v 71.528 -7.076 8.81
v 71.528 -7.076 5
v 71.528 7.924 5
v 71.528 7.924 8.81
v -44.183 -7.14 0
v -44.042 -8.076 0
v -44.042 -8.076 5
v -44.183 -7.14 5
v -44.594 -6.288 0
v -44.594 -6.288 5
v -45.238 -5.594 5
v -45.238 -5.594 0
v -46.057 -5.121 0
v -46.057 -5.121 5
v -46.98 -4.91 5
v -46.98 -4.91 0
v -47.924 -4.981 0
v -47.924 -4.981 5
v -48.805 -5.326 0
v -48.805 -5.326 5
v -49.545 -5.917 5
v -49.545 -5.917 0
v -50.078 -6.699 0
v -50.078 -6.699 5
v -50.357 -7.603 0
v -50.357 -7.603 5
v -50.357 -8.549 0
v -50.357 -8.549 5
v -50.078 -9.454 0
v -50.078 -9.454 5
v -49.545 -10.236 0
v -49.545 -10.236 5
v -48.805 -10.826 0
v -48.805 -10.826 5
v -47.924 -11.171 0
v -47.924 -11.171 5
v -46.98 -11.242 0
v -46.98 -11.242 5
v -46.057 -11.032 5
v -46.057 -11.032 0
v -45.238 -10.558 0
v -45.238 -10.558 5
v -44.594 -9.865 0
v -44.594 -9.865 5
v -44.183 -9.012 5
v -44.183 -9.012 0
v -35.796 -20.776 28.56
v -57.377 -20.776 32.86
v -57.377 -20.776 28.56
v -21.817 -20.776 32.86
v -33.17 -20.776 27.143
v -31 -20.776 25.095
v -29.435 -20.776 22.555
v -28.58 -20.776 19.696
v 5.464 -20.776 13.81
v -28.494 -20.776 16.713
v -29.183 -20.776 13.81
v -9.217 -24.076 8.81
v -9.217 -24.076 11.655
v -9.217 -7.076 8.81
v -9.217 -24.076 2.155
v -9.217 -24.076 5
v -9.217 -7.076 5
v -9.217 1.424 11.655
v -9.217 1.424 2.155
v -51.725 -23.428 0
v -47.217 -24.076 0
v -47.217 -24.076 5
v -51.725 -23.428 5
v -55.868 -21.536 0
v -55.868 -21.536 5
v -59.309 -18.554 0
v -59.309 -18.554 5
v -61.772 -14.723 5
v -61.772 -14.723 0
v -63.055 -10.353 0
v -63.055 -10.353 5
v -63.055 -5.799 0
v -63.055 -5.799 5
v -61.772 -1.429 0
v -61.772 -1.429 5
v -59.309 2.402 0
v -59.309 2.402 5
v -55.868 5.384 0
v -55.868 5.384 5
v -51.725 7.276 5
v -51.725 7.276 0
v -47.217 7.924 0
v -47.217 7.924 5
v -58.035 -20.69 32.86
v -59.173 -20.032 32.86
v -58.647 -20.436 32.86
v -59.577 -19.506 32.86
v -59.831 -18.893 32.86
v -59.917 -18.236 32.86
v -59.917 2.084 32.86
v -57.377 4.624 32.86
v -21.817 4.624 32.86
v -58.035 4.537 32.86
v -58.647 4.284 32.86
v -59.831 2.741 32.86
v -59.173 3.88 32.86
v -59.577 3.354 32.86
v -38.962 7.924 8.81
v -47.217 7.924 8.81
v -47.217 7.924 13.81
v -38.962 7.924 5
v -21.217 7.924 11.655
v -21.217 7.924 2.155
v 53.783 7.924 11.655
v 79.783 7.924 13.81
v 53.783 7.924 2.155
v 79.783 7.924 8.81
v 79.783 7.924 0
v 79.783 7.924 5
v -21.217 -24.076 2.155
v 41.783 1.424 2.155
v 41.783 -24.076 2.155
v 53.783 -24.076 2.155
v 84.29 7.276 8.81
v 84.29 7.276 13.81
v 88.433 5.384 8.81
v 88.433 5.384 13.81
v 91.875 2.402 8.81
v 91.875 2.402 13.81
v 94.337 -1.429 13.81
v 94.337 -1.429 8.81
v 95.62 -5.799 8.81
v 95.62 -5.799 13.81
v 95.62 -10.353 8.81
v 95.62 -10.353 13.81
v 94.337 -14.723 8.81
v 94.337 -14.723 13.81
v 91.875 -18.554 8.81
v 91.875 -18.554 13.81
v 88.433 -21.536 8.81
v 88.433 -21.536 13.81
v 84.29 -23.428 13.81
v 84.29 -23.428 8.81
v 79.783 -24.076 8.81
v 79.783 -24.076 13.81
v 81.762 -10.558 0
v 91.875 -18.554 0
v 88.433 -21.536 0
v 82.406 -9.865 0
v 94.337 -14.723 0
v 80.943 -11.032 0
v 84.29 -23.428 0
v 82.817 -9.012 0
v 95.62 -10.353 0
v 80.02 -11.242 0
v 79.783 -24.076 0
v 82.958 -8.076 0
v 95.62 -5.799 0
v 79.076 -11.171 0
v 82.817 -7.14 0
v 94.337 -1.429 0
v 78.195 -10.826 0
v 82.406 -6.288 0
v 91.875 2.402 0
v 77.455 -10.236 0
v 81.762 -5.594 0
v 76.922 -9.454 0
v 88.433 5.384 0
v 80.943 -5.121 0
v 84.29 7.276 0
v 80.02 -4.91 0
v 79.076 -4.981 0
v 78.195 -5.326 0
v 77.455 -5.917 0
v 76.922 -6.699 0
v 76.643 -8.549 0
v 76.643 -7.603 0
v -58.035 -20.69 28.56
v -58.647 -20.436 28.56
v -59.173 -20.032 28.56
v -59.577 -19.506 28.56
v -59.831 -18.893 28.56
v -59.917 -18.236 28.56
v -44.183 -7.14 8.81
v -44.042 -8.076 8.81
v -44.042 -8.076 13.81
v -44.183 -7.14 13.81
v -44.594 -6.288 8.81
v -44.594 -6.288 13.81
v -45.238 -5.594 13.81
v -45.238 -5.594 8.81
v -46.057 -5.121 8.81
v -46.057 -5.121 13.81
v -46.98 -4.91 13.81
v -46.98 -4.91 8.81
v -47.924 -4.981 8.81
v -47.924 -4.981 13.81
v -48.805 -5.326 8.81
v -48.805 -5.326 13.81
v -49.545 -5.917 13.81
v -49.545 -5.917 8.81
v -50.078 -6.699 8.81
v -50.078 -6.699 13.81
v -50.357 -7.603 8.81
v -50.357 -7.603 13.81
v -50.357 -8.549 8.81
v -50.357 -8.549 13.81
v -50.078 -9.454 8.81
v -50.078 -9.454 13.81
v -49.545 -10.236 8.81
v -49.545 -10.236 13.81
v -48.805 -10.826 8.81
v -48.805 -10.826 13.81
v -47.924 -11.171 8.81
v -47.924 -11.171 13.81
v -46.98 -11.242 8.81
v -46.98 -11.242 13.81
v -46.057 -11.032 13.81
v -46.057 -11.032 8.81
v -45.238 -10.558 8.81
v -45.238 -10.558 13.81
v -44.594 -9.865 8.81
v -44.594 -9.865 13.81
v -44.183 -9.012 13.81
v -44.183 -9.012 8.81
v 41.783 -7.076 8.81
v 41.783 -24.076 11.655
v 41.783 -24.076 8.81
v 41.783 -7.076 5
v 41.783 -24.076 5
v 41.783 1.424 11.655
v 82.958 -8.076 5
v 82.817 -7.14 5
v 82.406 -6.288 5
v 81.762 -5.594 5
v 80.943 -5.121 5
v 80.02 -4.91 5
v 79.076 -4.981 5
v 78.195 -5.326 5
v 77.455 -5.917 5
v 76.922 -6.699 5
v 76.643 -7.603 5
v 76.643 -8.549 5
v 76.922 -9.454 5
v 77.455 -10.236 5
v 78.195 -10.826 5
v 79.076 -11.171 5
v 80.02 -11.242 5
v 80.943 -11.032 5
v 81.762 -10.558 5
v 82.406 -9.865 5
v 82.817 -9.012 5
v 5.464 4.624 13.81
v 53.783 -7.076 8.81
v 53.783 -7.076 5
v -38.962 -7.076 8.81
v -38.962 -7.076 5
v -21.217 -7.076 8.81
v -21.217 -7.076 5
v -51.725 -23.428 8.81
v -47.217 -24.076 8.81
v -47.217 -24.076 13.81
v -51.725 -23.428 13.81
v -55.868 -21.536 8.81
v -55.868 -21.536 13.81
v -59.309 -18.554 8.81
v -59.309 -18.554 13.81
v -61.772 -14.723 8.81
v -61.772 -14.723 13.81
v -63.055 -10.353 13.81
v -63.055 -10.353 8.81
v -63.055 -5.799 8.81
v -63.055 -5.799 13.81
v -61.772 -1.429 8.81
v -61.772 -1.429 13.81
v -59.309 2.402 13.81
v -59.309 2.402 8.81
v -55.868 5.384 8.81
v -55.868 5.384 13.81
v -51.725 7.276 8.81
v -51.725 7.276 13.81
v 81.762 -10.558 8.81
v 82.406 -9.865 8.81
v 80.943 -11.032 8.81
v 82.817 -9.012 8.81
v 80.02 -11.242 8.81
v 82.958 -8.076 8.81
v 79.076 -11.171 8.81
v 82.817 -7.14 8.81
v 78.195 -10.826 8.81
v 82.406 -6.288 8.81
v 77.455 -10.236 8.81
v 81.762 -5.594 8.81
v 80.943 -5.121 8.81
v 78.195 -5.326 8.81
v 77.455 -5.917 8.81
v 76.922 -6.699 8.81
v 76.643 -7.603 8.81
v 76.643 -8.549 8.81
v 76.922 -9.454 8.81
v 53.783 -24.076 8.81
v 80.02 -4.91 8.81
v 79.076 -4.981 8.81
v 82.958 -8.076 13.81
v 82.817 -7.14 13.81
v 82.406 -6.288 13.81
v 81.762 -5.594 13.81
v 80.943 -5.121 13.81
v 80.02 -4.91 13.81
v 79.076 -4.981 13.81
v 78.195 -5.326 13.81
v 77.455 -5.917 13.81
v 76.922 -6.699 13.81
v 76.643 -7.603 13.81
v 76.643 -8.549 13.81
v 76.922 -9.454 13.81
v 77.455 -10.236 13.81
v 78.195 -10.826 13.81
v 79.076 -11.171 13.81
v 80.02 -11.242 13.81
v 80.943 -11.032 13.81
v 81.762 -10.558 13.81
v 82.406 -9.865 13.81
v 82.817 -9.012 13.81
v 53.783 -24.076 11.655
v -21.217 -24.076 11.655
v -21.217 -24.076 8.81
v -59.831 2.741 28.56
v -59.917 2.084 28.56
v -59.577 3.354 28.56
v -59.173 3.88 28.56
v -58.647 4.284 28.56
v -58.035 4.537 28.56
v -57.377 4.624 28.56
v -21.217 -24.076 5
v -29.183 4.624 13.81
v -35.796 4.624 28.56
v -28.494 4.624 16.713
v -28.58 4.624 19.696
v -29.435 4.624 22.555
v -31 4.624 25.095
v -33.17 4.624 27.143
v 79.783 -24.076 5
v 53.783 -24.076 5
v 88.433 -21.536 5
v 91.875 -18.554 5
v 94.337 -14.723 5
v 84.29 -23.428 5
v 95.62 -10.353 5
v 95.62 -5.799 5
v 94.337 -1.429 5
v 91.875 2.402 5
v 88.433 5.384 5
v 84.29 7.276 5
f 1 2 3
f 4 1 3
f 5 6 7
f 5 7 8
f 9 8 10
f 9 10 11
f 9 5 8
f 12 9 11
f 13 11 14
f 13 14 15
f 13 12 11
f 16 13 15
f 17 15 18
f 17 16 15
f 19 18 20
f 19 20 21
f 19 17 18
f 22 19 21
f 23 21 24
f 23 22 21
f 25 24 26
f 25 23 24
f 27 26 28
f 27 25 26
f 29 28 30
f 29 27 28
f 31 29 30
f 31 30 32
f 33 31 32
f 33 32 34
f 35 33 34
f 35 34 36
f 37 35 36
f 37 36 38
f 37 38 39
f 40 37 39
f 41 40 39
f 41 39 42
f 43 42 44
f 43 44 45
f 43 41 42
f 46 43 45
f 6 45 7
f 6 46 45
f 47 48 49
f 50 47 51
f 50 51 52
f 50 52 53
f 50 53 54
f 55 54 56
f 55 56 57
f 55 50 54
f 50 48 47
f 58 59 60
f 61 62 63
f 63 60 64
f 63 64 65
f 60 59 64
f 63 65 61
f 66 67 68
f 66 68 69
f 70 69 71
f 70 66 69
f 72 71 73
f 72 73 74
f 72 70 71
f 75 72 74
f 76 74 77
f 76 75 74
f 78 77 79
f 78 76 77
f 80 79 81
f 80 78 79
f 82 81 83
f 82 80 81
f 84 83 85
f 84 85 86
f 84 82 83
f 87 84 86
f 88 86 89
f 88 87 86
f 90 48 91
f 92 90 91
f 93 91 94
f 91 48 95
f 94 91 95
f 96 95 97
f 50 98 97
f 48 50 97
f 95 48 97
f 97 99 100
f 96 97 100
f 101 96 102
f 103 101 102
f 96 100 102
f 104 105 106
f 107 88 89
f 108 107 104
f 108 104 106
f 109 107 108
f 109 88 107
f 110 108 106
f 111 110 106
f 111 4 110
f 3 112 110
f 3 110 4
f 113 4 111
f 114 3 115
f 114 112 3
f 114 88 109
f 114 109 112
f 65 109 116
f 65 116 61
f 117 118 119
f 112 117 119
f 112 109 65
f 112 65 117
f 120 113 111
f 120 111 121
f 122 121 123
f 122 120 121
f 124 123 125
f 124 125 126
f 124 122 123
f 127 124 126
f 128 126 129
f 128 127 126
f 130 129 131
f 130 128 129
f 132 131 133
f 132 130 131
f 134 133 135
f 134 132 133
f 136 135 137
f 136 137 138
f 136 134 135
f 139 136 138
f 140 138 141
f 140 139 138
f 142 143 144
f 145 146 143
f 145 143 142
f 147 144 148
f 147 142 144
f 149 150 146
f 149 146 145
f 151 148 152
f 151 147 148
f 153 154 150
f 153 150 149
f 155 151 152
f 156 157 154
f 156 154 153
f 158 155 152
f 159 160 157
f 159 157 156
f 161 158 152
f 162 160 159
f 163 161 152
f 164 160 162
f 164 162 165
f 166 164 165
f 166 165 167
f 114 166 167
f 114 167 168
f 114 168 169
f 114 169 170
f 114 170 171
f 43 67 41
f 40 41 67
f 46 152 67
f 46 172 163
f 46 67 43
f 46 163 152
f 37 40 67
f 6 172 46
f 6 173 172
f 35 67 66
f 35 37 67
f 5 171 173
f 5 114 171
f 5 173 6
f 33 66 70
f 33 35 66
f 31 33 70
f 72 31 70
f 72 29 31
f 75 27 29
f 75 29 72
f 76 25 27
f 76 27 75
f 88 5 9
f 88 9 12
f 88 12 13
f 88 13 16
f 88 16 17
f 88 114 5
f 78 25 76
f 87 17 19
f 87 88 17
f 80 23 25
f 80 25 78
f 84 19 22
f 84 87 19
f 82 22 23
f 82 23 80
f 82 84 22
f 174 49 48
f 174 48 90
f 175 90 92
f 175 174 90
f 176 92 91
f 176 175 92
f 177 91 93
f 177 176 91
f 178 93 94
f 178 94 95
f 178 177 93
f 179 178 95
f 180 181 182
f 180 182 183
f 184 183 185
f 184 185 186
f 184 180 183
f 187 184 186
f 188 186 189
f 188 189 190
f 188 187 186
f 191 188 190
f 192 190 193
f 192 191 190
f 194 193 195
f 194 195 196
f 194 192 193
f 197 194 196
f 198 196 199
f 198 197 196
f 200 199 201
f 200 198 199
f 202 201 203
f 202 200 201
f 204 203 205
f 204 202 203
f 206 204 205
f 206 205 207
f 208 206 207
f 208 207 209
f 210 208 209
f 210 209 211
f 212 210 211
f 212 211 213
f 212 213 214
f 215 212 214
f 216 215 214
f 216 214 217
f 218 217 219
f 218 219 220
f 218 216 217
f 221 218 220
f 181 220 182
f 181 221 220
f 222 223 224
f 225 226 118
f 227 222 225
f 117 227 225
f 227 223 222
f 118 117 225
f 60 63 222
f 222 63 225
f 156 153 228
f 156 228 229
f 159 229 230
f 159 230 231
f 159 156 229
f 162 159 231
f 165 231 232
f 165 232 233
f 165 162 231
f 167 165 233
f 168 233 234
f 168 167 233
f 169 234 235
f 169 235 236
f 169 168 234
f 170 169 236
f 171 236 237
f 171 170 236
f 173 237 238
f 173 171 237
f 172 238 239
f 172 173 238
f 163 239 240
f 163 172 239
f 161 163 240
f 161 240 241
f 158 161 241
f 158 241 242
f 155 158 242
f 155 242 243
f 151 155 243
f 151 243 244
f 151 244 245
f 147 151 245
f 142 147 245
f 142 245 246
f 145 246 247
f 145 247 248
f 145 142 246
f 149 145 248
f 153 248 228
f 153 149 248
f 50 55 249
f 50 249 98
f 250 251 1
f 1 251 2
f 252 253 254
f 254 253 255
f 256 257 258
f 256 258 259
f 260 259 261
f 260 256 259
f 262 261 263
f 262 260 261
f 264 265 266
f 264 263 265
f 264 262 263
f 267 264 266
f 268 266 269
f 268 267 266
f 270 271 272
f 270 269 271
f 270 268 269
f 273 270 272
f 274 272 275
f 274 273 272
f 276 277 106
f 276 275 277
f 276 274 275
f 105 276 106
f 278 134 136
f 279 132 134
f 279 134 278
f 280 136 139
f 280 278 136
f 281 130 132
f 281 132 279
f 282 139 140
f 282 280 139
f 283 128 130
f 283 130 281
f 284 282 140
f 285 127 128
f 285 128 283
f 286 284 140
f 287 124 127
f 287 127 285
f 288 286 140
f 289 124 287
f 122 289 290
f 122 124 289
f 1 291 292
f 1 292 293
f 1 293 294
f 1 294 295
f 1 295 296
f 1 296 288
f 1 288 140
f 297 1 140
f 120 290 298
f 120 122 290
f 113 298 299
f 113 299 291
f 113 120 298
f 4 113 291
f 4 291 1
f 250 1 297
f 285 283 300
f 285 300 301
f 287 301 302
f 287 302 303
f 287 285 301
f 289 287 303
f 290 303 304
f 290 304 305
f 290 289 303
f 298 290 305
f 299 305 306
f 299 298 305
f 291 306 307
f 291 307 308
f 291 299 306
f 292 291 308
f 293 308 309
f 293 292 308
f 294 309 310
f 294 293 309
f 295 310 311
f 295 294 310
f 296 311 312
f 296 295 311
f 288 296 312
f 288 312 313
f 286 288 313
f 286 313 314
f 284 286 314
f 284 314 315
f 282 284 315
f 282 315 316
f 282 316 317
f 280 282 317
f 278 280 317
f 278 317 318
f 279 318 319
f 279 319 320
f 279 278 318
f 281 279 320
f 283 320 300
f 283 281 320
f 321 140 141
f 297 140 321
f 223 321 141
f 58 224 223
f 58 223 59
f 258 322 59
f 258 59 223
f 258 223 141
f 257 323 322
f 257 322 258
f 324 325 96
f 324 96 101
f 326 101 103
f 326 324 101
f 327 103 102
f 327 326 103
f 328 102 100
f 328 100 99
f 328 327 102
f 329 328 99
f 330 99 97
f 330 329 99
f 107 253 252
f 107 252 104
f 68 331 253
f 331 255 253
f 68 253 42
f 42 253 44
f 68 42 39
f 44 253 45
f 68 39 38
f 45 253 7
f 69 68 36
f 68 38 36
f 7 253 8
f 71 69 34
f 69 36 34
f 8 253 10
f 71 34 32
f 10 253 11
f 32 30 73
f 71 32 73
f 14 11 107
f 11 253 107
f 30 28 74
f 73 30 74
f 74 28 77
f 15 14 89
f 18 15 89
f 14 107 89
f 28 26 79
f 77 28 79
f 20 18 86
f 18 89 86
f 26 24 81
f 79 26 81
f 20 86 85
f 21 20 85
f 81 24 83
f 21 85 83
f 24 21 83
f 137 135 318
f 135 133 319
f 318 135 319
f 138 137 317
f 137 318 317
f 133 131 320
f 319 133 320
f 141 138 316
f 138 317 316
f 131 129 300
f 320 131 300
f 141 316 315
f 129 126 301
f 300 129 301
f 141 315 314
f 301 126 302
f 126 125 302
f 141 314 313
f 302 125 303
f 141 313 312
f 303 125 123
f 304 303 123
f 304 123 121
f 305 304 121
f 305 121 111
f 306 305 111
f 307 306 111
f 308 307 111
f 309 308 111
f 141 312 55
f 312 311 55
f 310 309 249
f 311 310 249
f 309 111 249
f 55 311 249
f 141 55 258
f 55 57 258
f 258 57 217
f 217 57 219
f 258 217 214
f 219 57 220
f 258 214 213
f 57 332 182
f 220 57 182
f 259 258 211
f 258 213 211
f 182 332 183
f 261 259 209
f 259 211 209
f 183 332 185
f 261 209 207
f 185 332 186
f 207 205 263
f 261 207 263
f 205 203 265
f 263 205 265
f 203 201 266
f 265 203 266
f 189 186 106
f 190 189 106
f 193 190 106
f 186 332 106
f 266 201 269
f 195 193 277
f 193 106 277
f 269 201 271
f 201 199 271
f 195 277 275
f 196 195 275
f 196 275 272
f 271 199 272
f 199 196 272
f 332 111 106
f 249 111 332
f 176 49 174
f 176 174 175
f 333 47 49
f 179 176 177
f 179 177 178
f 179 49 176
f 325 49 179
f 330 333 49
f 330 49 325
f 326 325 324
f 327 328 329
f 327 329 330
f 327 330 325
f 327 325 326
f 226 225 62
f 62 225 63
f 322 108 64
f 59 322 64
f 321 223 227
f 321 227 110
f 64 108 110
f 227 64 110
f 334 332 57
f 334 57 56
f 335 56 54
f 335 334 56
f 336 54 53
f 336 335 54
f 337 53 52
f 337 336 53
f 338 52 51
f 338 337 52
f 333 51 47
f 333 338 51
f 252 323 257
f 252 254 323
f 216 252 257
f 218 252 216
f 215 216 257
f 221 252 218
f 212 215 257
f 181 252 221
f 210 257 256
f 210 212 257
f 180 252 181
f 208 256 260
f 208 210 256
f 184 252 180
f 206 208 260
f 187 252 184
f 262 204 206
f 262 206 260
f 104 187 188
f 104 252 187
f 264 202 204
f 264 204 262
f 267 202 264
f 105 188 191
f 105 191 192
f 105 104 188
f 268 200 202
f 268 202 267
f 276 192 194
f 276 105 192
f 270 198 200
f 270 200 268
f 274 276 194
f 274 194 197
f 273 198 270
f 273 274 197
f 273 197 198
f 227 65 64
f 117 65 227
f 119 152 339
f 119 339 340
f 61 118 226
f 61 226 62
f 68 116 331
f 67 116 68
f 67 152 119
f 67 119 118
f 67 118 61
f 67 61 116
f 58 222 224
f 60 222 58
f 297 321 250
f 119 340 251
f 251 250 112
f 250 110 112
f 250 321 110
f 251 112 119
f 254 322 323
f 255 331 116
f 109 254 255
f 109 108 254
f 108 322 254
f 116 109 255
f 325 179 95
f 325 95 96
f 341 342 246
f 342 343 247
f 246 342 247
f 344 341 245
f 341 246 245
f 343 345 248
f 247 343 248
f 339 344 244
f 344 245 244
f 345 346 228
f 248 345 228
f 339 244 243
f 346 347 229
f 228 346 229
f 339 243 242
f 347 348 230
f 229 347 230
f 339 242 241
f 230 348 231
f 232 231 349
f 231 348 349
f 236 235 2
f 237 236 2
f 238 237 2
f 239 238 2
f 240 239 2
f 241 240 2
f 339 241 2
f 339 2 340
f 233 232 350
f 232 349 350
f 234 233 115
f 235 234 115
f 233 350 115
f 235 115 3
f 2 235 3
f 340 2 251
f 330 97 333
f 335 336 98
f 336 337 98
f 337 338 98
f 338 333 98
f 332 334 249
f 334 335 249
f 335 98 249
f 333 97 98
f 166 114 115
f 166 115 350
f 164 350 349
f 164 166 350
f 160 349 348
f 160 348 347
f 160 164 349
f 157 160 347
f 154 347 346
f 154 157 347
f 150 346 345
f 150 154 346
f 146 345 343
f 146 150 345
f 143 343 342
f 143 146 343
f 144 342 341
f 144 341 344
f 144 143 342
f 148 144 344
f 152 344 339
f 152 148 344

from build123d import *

# Parameters (mm, degrees)
SKETCH1_R           = 3.175
BOSS_EXTRUDE1_DEPTH = 5
SKETCH2_W           = 110.49
SKETCH2_H           = 15
BOSS_EXTRUDE2_DEPTH = 3.81
SKETCH5_R           = 3.175
BOSS_EXTRUDE3_DEPTH = 5
SKETCH6_W           = 75
SKETCH6_H           = 9.5
CUT_EXTRUDE1_DEPTH  = 6.5
SKETCH7_W           = 12
SKETCH7_H           = 9.5
CUT_EXTRUDE2_DEPTH  = 30.48
BOSS_EXTRUDE4_DEPTH = 19.05
CUT_EXTRUDE3_DEPTH  = 30.48
BOSS_EXTRUDE5_DEPTH = 25.4


with BuildPart() as part:
    # Sketch1 → Boss-Extrude1 (new body)
    with BuildSketch(Plane.XY):
        with BuildLine():
            Line((-47.217391304, 7.923913043), (79.782608696, 7.923913043))
            ThreePointArc((79.782608696, 7.923913043), (95.782608696, -8.076086957), (79.782608696, -24.076086957))
            Line((79.782608696, -24.076086957), (-47.217391304, -24.076086957))
            ThreePointArc((-47.217391304, -24.076086957), (-63.217391304, -8.076086957), (-47.217391304, 7.923913043))
        make_face()
        with Locations((-47.217391304, -8.076086957)):
            Circle(SKETCH1_R, mode=Mode.SUBTRACT)
        with Locations((79.782608696, -8.076086957)):
            Circle(SKETCH1_R, mode=Mode.SUBTRACT)
    extrude(amount=BOSS_EXTRUDE1_DEPTH)

    # Sketch2 → Boss-Extrude2 (add)
    with BuildSketch(Plane.XY.offset(5)):
        with Locations((16.282608696, 0.423913043)):
            Rectangle(SKETCH2_W, SKETCH2_H)
    extrude(amount=BOSS_EXTRUDE2_DEPTH)

    # Sketch5 → Boss-Extrude3 (add)
    with BuildSketch(Plane.XY.offset(8.81)):
        with BuildLine():
            Line((-47.217391304, 7.923913043), (79.782608696, 7.923913043))
            ThreePointArc((79.782608696, 7.923913043), (95.782608696, -8.076086957), (79.782608696, -24.076086957))
            Line((79.782608696, -24.076086957), (-47.217391304, -24.076086957))
            ThreePointArc((-47.217391304, -24.076086957), (-63.217391304, -8.076086957), (-47.217391304, 7.923913043))
        make_face()
        with Locations((-47.217391304, -8.076086957)):
            Circle(SKETCH5_R, mode=Mode.SUBTRACT)
        with Locations((79.782608696, -8.076086957)):
            Circle(SKETCH5_R, mode=Mode.SUBTRACT)
    extrude(amount=BOSS_EXTRUDE3_DEPTH)

    # Sketch6 → Cut-Extrude1 (cut)
    with BuildSketch(Plane(origin=(0, 7.923913043, 0), x_dir=(1, 0, 0), z_dir=(0, 1, 0))):
        with Locations((16.282608696, -6.905)):
            Rectangle(SKETCH6_W, SKETCH6_H)
    extrude(amount=-CUT_EXTRUDE1_DEPTH, mode=Mode.SUBTRACT)

    # Sketch7 → Cut-Extrude2 (cut)
    with BuildSketch(Plane(origin=(0, 1.423913043, 0), x_dir=(1, 0, 0), z_dir=(0, 1, 0))):
        with Locations((-15.217391304, -6.905)):
            Rectangle(SKETCH7_W, SKETCH7_H)
        with Locations((47.782608696, -6.905)):
            Rectangle(SKETCH7_W, SKETCH7_H)
    extrude(amount=-CUT_EXTRUDE2_DEPTH, mode=Mode.SUBTRACT)

    # Sketch10 → Boss-Extrude4 (add)
    with BuildSketch(Plane.XY.offset(13.81)):
        with BuildLine():
            Line((-34.517391304, -20.776086957), (-57.377391304, -20.776086957))
            ThreePointArc((-57.377391304, -20.776086957), (-59.173442529, -20.032138181), (-59.917391304, -18.236086957))
            Line((-59.917391304, -18.236086957), (-59.917391304, 2.083913043))
            ThreePointArc((-59.917391304, 2.083913043), (-59.173442529, 3.879964268), (-57.377391304, 4.623913043))
            Line((-57.377391304, 4.623913043), (-34.517391304, 4.623913043))
            Line((-34.517391304, 4.623913043), (-21.817391304, 4.623913043))
            Line((-21.817391304, 4.623913043), (-21.817391304, -20.776086957))
            Line((-21.817391304, -20.776086957), (-34.517391304, -20.776086957))
        make_face()
    extrude(amount=BOSS_EXTRUDE4_DEPTH)

    # Sketch14 → Cut-Extrude3 (cut)
    with BuildSketch(Plane(origin=(0, 4.623913043, 0), x_dir=(1, 0, 0), z_dir=(0, 1, 0))):
        with BuildLine():
            Line((-59.917391304, -13.81), (-29.183391304, -13.81))
            ThreePointArc((-29.183391304, -13.81), (-29.434604535, -22.554535578), (-35.79555952, -28.560221405))
            Line((-35.79555952, -28.560221405), (-59.917391304, -28.560221405))
            Line((-59.917391304, -28.560221405), (-59.917391304, -13.81))
        make_face()
    extrude(amount=-CUT_EXTRUDE3_DEPTH, mode=Mode.SUBTRACT)

    # Sketch15 → Boss-Extrude5 (add)
    with BuildSketch(Plane.XZ.offset(20.776086957)):
        Polygon((-21.817391304, 13.81), (5.46367495, 13.81), (-21.817391304, 32.86), align=None)
    extrude(amount=-BOSS_EXTRUDE5_DEPTH)


solid = part.part
